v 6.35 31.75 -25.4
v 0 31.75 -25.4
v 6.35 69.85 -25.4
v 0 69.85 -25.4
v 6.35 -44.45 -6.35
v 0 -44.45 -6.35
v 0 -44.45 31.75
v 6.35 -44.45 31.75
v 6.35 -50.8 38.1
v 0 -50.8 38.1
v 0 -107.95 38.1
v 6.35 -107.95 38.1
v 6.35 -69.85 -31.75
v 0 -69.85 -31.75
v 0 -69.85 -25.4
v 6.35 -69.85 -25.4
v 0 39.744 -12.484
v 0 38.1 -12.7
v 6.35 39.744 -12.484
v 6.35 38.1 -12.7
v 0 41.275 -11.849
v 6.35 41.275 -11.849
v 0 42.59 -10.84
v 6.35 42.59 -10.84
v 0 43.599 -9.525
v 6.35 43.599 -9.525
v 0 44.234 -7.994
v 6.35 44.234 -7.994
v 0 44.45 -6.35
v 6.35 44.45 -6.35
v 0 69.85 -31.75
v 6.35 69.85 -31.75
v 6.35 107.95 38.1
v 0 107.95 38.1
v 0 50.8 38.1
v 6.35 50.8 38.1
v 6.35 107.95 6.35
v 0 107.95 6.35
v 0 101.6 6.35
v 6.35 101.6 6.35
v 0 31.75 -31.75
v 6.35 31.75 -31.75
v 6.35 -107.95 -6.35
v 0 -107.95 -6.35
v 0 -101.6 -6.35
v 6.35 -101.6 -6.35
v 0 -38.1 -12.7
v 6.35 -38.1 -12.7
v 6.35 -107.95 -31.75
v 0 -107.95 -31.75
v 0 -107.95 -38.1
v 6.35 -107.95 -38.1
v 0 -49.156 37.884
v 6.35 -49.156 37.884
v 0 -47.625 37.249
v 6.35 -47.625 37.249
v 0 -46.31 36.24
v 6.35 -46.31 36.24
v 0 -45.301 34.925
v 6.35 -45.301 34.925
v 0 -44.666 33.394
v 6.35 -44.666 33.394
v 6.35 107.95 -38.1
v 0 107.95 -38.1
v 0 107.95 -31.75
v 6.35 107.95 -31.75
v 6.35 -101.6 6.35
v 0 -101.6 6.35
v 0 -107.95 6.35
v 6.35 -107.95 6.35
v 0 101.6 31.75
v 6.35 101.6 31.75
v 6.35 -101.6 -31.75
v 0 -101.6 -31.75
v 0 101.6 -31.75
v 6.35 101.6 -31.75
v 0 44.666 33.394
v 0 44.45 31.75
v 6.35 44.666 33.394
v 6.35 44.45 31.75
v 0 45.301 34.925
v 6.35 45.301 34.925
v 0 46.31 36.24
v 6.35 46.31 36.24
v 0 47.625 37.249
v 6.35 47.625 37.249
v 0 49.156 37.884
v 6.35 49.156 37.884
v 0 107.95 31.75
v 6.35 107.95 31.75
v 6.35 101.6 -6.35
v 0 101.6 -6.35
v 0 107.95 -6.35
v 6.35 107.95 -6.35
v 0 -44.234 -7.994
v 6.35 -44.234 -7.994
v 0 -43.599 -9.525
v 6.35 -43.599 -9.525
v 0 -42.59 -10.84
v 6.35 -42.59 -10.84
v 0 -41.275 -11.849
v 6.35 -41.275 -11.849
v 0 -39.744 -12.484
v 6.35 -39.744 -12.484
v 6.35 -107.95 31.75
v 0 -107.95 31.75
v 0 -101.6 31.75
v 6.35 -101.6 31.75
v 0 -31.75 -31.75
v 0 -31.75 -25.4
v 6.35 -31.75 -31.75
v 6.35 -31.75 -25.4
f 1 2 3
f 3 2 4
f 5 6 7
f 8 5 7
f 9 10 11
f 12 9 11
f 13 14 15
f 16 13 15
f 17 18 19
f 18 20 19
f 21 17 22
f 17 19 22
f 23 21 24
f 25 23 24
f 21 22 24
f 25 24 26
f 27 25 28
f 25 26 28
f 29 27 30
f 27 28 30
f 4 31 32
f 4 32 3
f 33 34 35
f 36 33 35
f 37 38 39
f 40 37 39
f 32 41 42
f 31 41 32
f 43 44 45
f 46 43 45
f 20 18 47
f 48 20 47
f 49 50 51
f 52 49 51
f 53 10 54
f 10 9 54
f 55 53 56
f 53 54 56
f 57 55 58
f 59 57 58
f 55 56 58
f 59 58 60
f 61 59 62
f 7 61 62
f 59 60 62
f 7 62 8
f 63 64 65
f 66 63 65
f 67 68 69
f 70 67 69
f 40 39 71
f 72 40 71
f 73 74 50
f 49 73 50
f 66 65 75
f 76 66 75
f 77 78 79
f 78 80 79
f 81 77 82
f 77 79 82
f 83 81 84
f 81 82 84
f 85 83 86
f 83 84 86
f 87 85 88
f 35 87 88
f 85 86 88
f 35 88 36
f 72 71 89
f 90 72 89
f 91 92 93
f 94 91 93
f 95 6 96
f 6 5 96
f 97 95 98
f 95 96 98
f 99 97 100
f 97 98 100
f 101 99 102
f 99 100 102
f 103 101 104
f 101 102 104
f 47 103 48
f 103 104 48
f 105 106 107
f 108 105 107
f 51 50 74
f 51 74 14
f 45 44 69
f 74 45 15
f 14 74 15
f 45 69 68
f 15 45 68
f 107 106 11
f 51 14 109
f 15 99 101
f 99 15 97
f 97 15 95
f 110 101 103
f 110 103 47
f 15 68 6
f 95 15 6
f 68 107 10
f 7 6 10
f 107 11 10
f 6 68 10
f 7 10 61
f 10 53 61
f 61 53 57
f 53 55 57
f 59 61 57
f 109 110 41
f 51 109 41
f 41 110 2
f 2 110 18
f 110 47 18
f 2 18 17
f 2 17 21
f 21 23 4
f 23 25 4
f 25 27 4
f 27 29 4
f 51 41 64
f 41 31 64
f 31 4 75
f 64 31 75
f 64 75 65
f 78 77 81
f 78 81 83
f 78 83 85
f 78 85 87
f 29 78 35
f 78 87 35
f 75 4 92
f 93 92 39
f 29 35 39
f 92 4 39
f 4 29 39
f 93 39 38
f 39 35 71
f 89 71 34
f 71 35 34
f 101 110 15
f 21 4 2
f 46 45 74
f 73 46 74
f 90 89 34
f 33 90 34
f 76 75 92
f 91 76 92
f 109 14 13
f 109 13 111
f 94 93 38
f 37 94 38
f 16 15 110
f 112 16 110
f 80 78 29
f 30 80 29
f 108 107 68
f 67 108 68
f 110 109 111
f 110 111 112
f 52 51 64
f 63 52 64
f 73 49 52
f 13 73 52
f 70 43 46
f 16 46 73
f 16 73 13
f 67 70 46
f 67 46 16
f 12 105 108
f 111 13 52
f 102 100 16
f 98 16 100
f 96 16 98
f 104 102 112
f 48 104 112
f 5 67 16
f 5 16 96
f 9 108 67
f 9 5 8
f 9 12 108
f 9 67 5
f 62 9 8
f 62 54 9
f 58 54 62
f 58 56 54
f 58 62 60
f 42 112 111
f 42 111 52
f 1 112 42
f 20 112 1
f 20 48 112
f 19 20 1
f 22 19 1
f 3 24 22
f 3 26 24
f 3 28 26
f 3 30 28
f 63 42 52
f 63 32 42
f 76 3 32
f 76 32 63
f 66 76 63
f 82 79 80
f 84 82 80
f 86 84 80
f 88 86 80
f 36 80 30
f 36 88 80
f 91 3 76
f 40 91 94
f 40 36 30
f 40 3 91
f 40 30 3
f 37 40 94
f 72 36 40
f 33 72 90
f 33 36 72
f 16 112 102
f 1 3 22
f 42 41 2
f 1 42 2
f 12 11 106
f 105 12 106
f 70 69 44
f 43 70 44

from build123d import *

# Parameters (mm, degrees)
F0_W     = 38.1
F0_H     = 6.35
F1_DEPTH = 6.35
F2_R     = 6.35


with BuildPart() as f1:
    # F0 (on Right) → F1 (new body)
    with BuildSketch(Plane.YZ):
        Polygon((-44.45, 38.1), (-107.95, 38.1), (-107.95, 31.75), (-101.6, 31.75), (-101.6, 6.35), (-107.95, 6.35), (-107.95, -6.35), (-101.6, -6.35), (-101.6, -31.75), (-107.95, -31.75), (-107.95, -38.1), (107.95, -38.1), (107.95, -31.75), (101.6, -31.75), (101.6, -6.35), (107.95, -6.35), (107.95, 6.35), (101.6, 6.35), (101.6, 31.75), (107.95, 31.75), (107.95, 38.1), (44.45, 38.1), (44.45, -12.7), (-44.45, -12.7), align=None)
        with Locations((-50.8, -28.575)):
            Rectangle(F0_W, F0_H, mode=Mode.SUBTRACT)
        with Locations((50.8, -28.575)):
            Rectangle(F0_W, F0_H, mode=Mode.SUBTRACT)
    extrude(amount=F1_DEPTH)

    # F2
    f2_edges = [f1.edges().sort_by_distance(p)[0] for p in [
        (3.175, -44.45, 38.1),
        (3.175, -44.45, -12.7),
        (3.175, 44.45, 38.1),
        (3.175, 44.45, -12.7),
    ]]
    fillet(f2_edges, radius=F2_R)


solid = f1.part
